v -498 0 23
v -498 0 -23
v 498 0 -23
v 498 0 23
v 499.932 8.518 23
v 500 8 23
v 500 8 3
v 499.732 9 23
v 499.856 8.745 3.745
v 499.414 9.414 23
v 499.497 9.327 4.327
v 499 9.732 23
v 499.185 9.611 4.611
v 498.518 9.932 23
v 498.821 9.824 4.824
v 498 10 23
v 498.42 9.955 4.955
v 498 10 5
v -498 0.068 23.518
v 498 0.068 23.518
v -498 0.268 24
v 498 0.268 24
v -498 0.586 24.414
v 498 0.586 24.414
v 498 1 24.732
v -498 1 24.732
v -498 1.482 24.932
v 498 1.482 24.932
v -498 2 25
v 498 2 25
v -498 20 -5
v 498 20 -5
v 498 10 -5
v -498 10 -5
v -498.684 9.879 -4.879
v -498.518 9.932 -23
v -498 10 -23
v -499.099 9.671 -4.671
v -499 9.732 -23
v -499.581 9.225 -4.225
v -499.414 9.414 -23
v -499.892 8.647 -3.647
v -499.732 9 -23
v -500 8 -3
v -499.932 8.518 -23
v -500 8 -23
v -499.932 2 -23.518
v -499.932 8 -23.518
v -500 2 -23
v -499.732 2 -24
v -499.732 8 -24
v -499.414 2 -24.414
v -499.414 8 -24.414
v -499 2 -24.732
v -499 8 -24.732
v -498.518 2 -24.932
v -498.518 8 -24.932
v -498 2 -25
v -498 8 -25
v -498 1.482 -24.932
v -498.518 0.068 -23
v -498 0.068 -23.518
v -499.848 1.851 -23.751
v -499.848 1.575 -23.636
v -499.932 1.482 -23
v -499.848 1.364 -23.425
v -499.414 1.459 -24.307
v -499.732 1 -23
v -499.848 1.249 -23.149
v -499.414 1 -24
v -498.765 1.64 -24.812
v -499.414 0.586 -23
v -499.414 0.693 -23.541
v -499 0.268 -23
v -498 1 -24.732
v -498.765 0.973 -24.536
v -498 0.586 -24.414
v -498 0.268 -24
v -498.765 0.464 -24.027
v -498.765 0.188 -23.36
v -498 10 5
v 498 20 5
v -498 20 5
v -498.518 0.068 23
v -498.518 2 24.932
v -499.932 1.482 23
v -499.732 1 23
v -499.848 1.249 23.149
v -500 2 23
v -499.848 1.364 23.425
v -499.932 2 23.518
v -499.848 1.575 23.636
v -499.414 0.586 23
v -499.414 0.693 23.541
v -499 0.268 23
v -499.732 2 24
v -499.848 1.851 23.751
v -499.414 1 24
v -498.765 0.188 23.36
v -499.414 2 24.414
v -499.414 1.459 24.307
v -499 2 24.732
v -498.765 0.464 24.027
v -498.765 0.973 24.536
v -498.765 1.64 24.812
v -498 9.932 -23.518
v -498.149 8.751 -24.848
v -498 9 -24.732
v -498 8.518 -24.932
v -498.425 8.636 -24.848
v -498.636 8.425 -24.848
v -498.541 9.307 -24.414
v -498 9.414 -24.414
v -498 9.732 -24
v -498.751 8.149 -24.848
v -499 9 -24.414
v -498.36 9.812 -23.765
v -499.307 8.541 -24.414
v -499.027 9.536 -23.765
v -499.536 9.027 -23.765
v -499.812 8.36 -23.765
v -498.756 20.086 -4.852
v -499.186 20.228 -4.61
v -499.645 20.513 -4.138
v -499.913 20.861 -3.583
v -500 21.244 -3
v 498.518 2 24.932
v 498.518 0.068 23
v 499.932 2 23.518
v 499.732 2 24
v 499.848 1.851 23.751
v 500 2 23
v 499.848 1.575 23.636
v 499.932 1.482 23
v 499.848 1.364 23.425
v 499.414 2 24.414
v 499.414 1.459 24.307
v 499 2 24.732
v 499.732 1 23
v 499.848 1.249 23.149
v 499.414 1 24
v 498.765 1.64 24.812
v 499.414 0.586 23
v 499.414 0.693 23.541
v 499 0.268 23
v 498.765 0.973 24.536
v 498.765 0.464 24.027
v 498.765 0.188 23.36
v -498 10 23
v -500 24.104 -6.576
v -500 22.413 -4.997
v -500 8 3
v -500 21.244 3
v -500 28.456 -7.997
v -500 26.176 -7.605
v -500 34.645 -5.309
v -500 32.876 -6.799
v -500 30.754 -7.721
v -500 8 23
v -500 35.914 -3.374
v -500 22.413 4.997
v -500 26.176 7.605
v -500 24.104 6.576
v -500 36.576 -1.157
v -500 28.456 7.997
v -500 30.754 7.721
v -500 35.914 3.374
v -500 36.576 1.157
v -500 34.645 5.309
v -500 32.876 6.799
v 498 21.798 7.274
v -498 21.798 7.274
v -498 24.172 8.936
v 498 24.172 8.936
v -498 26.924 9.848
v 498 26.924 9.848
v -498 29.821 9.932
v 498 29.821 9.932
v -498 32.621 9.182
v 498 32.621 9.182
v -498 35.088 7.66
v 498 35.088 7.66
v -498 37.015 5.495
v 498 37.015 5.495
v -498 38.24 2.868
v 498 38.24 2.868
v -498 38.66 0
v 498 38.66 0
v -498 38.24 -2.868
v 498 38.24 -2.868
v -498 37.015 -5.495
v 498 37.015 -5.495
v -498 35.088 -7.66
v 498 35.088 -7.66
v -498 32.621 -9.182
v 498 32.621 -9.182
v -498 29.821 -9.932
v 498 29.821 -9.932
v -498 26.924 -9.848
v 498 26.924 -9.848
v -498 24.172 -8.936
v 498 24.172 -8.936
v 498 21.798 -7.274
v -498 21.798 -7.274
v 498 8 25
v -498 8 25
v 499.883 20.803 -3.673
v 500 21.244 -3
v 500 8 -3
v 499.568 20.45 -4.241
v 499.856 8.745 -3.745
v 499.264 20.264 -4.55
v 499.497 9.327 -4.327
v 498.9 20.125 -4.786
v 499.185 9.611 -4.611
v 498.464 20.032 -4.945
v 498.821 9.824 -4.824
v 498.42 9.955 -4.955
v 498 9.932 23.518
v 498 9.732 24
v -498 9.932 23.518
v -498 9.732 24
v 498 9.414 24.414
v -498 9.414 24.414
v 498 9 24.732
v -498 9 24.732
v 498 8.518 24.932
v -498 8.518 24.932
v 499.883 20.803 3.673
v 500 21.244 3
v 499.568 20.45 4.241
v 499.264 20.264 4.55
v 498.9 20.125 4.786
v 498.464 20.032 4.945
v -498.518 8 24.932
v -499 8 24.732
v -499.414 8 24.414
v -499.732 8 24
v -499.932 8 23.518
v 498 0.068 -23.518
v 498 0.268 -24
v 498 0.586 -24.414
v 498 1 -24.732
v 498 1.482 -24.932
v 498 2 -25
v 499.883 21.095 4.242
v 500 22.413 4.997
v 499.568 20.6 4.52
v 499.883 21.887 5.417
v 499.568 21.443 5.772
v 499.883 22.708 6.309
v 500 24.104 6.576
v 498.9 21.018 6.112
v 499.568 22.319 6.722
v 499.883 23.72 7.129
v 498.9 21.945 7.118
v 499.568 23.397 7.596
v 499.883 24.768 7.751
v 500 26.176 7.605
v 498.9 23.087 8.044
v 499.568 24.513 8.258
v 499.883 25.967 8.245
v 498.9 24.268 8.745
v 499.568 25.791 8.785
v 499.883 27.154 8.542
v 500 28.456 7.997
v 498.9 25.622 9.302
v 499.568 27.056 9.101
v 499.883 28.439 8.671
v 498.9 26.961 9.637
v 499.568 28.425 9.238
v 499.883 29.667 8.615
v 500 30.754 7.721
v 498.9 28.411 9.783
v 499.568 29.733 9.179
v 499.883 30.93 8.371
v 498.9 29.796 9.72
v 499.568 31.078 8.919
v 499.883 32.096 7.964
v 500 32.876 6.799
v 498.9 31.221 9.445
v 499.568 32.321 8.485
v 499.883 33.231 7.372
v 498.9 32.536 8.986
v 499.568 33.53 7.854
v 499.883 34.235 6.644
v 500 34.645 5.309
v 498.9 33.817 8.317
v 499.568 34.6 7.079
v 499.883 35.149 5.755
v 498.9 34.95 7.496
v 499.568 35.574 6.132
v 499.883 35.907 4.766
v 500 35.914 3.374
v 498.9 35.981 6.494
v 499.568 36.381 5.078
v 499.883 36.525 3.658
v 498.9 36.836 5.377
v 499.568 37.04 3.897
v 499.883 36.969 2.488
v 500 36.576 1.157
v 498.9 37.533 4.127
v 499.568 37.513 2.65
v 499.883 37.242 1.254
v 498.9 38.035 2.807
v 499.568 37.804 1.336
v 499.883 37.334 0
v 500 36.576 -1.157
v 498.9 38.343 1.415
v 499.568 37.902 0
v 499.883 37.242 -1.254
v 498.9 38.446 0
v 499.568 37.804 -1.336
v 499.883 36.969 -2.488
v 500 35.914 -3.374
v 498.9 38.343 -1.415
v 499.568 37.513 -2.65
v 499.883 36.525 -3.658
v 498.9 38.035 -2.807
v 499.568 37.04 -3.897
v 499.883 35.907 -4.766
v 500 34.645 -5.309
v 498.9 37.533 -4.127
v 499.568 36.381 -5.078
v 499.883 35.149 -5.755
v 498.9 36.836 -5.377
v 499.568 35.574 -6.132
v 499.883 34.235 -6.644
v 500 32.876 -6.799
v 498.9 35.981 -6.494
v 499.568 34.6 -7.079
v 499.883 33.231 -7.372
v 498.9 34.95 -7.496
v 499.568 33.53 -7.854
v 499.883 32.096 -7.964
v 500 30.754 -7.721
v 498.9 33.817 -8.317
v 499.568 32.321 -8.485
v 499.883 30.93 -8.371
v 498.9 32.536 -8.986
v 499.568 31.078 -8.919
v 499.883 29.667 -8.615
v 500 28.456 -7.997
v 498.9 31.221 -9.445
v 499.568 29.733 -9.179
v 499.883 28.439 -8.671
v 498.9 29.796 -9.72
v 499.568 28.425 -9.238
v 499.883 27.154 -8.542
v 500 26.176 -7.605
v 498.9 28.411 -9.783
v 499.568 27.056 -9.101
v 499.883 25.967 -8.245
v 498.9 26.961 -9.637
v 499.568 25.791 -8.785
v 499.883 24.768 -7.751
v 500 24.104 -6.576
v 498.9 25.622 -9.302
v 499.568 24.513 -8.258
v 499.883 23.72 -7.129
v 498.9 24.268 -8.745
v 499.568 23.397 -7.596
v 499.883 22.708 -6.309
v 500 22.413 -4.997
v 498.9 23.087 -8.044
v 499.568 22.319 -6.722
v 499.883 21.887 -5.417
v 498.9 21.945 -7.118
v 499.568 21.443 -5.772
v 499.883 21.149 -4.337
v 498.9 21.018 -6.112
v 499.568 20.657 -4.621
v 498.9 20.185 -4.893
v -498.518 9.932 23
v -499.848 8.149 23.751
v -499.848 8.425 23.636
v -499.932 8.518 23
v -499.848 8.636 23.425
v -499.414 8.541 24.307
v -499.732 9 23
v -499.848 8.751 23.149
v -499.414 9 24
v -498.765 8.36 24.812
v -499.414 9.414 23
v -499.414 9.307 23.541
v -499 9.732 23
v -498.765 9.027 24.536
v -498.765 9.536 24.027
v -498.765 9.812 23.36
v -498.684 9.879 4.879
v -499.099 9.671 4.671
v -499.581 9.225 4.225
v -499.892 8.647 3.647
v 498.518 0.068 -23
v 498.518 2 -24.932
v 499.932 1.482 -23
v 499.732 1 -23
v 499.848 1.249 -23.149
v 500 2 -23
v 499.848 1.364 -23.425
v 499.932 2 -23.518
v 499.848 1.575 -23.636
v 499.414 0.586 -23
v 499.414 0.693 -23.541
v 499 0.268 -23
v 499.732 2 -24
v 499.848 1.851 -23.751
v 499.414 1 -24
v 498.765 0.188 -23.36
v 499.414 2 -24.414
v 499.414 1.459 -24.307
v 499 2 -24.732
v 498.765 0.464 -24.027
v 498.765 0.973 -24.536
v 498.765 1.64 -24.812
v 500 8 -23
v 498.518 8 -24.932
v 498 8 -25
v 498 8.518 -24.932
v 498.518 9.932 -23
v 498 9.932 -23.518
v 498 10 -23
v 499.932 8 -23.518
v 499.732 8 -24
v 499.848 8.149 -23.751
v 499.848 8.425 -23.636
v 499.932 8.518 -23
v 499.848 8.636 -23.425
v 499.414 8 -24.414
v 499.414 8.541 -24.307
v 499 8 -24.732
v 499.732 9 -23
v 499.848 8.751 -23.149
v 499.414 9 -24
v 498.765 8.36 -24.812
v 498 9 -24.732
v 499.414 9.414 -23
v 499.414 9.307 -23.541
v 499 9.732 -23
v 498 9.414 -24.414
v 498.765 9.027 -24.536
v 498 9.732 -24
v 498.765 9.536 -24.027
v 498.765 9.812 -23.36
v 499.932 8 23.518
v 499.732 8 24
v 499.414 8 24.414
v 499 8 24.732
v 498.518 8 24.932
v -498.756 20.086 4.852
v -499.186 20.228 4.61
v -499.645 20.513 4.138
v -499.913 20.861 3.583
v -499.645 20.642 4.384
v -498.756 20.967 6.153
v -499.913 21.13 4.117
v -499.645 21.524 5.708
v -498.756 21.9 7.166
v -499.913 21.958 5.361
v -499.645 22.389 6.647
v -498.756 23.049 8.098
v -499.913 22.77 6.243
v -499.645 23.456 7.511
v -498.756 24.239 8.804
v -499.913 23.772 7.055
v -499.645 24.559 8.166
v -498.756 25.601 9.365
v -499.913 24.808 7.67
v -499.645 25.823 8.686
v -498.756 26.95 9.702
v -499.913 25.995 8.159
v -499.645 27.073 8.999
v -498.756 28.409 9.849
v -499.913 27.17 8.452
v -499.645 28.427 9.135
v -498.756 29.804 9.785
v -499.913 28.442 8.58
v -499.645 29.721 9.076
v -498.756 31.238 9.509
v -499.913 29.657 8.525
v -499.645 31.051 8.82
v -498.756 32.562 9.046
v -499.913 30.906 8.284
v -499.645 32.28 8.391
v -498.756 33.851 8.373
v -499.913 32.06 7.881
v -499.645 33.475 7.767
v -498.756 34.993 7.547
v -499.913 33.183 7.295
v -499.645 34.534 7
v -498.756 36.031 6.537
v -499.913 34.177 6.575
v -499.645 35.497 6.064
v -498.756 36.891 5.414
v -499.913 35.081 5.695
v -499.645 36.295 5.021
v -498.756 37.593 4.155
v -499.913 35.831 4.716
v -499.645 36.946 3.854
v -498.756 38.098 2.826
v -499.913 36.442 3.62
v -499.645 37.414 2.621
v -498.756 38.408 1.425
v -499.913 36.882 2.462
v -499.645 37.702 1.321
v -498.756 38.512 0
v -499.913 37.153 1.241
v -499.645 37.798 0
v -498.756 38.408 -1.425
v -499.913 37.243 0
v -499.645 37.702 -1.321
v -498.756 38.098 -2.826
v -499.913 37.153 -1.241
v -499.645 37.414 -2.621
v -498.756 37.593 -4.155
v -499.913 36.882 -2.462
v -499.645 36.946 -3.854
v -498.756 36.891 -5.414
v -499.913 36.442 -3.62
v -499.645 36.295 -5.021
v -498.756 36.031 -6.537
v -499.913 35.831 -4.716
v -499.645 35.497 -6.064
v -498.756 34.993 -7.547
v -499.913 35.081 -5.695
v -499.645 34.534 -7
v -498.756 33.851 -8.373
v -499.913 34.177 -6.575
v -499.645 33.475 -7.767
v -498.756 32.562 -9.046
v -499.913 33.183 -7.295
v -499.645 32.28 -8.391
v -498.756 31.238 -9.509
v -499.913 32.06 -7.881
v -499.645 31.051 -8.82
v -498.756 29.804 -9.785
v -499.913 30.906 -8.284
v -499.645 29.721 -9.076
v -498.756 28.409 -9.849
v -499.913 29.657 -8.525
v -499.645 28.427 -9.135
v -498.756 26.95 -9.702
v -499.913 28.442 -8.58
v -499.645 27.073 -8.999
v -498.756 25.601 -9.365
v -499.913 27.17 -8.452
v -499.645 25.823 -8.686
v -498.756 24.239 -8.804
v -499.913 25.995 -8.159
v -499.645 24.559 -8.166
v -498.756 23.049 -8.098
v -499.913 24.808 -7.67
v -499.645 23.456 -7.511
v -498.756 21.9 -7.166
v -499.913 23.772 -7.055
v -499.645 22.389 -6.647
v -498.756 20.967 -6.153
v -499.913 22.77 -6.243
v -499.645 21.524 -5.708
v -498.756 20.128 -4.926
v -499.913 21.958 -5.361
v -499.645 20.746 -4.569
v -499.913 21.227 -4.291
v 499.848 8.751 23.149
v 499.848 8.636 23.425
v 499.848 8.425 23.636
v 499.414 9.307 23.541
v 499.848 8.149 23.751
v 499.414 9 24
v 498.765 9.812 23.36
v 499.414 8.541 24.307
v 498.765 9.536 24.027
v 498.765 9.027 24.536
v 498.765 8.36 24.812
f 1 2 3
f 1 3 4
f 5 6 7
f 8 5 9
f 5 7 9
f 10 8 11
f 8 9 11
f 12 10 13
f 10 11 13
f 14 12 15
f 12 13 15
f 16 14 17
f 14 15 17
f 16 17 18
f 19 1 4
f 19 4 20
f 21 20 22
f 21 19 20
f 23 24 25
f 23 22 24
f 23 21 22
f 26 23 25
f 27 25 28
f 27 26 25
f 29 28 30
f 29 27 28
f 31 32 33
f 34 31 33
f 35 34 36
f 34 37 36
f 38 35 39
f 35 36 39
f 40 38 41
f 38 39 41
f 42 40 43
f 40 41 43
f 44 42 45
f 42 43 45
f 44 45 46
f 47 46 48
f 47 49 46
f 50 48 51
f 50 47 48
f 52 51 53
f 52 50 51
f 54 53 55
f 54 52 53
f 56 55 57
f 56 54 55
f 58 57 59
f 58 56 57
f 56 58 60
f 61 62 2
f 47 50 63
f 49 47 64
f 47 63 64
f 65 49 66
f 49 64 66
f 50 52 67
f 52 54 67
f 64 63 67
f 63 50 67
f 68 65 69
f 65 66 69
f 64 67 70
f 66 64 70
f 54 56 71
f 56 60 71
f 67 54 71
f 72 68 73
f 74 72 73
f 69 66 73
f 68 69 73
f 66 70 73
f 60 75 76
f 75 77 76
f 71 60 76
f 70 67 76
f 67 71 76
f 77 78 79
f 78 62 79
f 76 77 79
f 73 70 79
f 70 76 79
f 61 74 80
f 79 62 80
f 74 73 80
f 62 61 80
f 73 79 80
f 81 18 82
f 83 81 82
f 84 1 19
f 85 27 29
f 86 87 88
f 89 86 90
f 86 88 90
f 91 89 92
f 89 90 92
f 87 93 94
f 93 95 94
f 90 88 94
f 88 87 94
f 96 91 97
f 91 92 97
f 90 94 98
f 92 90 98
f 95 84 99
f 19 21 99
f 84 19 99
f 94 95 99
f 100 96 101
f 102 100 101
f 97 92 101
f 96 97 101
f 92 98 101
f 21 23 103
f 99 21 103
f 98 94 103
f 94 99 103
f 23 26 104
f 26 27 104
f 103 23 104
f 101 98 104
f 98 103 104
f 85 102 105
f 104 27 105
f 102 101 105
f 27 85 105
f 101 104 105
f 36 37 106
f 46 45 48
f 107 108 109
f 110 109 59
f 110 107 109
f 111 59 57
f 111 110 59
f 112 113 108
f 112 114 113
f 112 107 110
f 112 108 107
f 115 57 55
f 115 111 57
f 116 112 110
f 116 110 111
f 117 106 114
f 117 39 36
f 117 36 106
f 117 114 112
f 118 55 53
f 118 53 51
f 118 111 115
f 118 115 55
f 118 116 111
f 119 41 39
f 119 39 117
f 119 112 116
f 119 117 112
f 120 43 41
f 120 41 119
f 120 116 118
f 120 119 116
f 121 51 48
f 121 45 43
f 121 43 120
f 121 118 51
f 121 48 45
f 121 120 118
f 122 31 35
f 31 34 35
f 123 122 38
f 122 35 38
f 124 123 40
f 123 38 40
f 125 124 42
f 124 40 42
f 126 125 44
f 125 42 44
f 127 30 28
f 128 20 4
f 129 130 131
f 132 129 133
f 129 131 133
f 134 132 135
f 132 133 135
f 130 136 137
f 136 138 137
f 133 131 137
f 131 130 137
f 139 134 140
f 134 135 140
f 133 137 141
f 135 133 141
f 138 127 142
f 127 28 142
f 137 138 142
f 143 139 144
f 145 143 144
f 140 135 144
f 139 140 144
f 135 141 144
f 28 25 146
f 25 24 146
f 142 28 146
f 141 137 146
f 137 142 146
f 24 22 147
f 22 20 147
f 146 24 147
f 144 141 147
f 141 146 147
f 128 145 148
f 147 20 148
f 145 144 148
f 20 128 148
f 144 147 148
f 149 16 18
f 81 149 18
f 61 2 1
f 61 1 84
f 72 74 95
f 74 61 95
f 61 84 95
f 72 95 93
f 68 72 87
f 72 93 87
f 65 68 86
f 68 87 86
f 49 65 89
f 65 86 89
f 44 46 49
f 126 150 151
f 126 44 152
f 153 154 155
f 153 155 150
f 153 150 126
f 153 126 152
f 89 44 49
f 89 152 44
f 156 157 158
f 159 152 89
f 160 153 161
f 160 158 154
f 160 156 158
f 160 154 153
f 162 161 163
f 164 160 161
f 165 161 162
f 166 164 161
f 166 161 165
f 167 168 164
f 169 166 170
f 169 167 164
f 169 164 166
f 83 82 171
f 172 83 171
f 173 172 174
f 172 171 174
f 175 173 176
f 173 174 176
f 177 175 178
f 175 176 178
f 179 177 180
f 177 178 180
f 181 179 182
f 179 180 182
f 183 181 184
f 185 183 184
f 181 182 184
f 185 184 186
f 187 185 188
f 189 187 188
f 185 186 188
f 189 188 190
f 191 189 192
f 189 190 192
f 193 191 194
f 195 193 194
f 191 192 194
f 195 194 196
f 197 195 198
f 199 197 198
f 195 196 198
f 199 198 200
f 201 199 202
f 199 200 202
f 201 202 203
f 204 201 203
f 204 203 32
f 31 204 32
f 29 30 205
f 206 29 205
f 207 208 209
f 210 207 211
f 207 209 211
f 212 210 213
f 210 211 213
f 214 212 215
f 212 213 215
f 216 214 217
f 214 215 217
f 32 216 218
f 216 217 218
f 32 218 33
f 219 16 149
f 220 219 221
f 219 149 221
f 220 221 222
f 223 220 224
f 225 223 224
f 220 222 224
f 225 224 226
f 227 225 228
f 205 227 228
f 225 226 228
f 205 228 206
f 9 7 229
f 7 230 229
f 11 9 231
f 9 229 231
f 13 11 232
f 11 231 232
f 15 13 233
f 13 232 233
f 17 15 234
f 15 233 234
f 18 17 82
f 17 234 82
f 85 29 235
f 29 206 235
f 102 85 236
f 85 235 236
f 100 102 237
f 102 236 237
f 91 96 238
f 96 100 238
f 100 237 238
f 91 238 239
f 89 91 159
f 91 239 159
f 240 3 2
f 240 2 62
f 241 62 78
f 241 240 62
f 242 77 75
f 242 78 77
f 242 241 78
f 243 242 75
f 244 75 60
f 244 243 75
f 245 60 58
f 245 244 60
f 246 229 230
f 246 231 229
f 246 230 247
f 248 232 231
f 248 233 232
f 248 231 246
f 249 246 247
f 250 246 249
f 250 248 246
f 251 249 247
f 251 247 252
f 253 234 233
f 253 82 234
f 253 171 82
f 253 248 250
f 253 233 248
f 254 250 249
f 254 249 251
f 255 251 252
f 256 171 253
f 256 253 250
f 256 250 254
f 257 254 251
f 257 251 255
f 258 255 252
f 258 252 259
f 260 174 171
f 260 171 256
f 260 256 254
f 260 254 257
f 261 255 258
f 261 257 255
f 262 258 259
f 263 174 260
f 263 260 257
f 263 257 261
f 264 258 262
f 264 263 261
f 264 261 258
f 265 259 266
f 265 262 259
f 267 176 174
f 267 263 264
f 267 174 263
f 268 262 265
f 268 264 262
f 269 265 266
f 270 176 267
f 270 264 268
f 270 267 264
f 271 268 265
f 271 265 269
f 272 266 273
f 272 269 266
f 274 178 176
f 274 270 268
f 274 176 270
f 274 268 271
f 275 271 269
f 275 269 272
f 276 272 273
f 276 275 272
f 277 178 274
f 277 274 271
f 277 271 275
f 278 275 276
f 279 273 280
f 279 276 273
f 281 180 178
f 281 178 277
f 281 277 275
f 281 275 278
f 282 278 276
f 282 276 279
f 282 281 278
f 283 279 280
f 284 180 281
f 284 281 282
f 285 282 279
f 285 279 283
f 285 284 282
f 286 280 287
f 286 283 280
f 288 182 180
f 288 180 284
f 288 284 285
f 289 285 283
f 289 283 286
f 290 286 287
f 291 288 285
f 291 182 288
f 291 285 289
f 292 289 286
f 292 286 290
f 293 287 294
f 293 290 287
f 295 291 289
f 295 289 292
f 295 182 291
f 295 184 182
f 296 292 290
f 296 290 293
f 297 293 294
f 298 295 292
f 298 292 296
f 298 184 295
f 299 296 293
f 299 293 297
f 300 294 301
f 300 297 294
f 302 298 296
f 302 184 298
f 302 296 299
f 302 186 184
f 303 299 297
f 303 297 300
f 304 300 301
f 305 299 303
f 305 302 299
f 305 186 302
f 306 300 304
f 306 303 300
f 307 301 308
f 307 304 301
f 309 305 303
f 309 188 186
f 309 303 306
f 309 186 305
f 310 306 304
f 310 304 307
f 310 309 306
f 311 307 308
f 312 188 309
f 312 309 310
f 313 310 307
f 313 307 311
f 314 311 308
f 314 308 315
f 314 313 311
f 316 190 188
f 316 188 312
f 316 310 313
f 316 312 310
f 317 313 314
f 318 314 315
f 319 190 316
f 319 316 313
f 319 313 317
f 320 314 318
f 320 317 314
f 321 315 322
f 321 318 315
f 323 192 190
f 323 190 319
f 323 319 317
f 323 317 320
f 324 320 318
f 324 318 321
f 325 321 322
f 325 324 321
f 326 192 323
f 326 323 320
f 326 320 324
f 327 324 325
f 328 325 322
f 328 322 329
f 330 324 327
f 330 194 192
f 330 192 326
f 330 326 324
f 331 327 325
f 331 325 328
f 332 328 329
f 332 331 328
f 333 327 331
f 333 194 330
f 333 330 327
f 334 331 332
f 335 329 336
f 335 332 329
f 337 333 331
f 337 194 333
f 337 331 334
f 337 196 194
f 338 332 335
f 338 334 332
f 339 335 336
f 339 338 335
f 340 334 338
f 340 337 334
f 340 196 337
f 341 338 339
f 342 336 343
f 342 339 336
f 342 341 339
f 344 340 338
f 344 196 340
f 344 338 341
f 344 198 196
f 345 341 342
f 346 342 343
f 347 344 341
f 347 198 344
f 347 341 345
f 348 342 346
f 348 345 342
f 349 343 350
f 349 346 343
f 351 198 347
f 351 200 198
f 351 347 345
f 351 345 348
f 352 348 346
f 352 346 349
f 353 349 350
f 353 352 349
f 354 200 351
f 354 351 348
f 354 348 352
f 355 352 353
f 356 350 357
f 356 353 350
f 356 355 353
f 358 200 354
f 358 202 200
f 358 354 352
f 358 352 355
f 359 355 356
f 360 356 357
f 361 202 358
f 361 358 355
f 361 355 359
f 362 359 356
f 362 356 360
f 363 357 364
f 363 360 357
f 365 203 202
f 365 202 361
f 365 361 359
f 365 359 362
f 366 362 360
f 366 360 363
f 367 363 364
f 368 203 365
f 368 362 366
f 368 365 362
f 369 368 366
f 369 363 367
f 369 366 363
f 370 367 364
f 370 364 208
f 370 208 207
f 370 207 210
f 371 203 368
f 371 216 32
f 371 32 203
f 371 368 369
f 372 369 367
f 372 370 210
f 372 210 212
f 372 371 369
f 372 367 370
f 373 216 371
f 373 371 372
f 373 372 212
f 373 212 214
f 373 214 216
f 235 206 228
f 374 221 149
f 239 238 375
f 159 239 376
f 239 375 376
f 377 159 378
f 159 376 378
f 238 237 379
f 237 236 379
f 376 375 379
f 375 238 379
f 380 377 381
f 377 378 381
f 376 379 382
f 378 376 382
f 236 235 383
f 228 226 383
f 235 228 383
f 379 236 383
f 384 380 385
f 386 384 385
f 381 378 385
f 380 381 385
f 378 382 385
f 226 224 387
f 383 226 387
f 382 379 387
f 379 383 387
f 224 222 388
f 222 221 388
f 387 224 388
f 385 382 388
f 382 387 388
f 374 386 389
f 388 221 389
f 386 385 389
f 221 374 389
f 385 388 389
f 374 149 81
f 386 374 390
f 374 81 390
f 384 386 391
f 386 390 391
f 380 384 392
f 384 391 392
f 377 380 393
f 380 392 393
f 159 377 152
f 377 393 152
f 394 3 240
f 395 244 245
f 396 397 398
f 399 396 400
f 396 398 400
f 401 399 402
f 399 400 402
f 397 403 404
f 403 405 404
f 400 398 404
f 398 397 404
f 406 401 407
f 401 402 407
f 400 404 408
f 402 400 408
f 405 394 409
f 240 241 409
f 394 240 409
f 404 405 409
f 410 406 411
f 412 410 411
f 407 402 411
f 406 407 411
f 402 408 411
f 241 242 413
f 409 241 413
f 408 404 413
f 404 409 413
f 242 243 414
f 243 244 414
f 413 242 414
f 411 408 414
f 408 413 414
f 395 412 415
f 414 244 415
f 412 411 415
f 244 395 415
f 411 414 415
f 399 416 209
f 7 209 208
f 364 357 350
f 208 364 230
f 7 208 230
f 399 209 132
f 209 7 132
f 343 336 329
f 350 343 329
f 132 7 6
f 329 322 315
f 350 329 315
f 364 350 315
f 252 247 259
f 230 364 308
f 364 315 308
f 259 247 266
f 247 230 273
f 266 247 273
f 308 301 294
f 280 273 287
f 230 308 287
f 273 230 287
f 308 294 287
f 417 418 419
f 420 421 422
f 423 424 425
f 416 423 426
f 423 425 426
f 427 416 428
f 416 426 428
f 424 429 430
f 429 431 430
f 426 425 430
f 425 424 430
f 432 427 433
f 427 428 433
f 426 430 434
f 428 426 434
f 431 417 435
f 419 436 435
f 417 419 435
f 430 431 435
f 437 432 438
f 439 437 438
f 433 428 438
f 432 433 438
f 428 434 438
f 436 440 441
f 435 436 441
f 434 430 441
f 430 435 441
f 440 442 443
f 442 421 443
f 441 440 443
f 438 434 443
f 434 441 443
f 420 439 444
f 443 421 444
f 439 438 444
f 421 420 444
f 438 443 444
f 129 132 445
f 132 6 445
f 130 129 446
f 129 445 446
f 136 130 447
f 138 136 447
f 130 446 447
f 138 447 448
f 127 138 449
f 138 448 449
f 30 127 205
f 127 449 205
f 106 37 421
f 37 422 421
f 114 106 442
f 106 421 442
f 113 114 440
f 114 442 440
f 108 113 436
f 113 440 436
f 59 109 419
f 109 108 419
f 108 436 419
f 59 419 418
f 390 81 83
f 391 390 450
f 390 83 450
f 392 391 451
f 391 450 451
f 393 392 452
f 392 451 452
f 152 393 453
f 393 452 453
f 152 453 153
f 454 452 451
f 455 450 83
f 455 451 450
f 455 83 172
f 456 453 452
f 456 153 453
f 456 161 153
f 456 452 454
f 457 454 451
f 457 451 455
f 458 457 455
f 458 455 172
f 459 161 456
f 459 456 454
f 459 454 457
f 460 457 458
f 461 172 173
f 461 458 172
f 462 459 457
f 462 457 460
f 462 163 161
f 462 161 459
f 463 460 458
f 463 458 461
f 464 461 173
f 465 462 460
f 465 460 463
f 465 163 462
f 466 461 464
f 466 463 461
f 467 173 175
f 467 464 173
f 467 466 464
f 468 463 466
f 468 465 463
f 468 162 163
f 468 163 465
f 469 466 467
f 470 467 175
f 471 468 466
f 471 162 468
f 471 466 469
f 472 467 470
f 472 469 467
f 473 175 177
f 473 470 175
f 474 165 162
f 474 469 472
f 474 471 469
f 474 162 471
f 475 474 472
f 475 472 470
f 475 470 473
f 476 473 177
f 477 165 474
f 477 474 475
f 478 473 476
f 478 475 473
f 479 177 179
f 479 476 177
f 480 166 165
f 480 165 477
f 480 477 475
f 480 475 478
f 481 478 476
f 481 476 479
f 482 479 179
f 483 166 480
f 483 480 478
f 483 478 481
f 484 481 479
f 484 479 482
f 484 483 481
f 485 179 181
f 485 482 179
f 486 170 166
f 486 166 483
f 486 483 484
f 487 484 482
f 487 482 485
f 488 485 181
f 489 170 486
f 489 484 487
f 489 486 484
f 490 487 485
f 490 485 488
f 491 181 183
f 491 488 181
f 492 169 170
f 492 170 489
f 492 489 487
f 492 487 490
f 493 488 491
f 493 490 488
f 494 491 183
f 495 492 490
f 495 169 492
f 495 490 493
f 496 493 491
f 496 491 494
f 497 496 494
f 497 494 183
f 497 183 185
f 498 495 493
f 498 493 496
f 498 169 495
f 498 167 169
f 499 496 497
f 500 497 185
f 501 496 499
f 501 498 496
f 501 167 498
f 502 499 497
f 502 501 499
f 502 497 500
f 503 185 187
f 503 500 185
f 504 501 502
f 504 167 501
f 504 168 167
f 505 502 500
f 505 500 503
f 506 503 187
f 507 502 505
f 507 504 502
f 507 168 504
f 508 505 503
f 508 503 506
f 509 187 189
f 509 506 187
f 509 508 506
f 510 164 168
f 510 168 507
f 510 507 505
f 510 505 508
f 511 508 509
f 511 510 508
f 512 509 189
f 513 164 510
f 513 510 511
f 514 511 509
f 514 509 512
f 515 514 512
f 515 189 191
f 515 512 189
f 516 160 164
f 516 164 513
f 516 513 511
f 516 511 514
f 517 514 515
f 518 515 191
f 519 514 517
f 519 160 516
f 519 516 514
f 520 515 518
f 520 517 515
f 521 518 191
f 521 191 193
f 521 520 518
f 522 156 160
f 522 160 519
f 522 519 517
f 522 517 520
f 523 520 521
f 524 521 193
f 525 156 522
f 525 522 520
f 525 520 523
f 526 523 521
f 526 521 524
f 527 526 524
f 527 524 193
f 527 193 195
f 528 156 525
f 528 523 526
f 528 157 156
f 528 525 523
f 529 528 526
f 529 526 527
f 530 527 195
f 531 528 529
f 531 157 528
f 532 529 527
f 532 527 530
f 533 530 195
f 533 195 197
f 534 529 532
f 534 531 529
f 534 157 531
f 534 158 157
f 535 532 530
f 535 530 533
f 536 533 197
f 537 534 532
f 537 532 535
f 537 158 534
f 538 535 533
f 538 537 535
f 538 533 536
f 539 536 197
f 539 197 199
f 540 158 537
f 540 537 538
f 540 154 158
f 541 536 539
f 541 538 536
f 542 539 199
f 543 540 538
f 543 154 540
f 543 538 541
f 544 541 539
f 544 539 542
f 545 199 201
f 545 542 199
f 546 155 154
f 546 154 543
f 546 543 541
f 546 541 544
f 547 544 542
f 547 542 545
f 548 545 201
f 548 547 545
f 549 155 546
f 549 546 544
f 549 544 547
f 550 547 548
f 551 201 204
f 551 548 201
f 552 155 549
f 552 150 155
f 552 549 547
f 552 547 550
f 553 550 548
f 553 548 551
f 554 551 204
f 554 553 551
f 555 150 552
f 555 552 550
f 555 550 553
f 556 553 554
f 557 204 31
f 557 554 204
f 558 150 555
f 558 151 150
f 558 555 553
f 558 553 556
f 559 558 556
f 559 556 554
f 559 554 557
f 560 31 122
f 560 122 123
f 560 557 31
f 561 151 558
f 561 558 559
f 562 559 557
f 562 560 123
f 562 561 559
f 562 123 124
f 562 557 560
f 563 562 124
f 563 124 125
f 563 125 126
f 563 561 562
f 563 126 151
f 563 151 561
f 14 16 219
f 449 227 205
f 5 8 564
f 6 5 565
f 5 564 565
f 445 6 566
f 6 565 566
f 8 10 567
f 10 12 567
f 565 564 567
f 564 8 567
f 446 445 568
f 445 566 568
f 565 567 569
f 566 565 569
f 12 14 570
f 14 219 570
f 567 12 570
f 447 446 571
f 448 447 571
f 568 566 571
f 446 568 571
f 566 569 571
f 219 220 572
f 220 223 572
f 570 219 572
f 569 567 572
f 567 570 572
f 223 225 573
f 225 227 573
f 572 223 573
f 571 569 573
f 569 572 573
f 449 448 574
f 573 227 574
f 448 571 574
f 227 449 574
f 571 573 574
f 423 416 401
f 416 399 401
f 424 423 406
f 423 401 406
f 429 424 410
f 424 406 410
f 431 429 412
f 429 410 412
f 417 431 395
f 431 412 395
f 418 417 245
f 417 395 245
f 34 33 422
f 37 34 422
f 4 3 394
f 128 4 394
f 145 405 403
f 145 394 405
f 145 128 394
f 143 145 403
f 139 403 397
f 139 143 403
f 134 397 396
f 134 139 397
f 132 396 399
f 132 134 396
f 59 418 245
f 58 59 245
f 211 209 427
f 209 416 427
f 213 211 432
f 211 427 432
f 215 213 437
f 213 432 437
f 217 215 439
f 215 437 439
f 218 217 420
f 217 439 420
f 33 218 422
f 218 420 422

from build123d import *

# Parameters (mm, degrees)
BOSS_EXTRUDE1_DEPTH = 500
FILLET1_R           = 2


with BuildPart() as part:
    # Sketch2 → Boss-Extrude1 (new body, symmetric)
    with BuildSketch(Plane(origin=(0, 0, 0), x_dir=(0, 0, -1), z_dir=(1, 0, 0))):
        with BuildLine():
            Line((25, 0), (-25, 0))
            Line((-25, 0), (-25, 10))
            Line((-25, 10), (-5, 10))
            Line((-5, 10), (-5, 20))
            ThreePointArc((-5, 20), (0, 38.660254038), (5, 20))
            Line((5, 20), (5, 10))
            Line((5, 10), (25, 10))
            Line((25, 10), (25, 0))
        make_face()
    extrude(amount=BOSS_EXTRUDE1_DEPTH, both=True)

    # Fillet1
    fillet1_edges = [part.edges().sort_by_distance(p)[0] for p in [
        (500, 38.660254038, 0),
        (-500, 15, -5),
        (-500, 10, -15),
        (500, 15, 5),
        (0, 10, -25),
        (0, 0, -25),
        (0, 0, 25),
        (0, 10, 25),
        (500, 10, 15),
        (500, 5, 25),
        (500, 0, 0),
        (500, 5, -25),
        (500, 10, -15),
        (500, 15, -5),
        (-500, 5, -25),
        (-500, 0, 0),
        (-500, 5, 25),
        (-500, 10, 15),
        (-500, 15, 5),
        (-500, 38.660254038, 0),
    ]]
    fillet(fillet1_edges, radius=FILLET1_R)


solid = part.part
